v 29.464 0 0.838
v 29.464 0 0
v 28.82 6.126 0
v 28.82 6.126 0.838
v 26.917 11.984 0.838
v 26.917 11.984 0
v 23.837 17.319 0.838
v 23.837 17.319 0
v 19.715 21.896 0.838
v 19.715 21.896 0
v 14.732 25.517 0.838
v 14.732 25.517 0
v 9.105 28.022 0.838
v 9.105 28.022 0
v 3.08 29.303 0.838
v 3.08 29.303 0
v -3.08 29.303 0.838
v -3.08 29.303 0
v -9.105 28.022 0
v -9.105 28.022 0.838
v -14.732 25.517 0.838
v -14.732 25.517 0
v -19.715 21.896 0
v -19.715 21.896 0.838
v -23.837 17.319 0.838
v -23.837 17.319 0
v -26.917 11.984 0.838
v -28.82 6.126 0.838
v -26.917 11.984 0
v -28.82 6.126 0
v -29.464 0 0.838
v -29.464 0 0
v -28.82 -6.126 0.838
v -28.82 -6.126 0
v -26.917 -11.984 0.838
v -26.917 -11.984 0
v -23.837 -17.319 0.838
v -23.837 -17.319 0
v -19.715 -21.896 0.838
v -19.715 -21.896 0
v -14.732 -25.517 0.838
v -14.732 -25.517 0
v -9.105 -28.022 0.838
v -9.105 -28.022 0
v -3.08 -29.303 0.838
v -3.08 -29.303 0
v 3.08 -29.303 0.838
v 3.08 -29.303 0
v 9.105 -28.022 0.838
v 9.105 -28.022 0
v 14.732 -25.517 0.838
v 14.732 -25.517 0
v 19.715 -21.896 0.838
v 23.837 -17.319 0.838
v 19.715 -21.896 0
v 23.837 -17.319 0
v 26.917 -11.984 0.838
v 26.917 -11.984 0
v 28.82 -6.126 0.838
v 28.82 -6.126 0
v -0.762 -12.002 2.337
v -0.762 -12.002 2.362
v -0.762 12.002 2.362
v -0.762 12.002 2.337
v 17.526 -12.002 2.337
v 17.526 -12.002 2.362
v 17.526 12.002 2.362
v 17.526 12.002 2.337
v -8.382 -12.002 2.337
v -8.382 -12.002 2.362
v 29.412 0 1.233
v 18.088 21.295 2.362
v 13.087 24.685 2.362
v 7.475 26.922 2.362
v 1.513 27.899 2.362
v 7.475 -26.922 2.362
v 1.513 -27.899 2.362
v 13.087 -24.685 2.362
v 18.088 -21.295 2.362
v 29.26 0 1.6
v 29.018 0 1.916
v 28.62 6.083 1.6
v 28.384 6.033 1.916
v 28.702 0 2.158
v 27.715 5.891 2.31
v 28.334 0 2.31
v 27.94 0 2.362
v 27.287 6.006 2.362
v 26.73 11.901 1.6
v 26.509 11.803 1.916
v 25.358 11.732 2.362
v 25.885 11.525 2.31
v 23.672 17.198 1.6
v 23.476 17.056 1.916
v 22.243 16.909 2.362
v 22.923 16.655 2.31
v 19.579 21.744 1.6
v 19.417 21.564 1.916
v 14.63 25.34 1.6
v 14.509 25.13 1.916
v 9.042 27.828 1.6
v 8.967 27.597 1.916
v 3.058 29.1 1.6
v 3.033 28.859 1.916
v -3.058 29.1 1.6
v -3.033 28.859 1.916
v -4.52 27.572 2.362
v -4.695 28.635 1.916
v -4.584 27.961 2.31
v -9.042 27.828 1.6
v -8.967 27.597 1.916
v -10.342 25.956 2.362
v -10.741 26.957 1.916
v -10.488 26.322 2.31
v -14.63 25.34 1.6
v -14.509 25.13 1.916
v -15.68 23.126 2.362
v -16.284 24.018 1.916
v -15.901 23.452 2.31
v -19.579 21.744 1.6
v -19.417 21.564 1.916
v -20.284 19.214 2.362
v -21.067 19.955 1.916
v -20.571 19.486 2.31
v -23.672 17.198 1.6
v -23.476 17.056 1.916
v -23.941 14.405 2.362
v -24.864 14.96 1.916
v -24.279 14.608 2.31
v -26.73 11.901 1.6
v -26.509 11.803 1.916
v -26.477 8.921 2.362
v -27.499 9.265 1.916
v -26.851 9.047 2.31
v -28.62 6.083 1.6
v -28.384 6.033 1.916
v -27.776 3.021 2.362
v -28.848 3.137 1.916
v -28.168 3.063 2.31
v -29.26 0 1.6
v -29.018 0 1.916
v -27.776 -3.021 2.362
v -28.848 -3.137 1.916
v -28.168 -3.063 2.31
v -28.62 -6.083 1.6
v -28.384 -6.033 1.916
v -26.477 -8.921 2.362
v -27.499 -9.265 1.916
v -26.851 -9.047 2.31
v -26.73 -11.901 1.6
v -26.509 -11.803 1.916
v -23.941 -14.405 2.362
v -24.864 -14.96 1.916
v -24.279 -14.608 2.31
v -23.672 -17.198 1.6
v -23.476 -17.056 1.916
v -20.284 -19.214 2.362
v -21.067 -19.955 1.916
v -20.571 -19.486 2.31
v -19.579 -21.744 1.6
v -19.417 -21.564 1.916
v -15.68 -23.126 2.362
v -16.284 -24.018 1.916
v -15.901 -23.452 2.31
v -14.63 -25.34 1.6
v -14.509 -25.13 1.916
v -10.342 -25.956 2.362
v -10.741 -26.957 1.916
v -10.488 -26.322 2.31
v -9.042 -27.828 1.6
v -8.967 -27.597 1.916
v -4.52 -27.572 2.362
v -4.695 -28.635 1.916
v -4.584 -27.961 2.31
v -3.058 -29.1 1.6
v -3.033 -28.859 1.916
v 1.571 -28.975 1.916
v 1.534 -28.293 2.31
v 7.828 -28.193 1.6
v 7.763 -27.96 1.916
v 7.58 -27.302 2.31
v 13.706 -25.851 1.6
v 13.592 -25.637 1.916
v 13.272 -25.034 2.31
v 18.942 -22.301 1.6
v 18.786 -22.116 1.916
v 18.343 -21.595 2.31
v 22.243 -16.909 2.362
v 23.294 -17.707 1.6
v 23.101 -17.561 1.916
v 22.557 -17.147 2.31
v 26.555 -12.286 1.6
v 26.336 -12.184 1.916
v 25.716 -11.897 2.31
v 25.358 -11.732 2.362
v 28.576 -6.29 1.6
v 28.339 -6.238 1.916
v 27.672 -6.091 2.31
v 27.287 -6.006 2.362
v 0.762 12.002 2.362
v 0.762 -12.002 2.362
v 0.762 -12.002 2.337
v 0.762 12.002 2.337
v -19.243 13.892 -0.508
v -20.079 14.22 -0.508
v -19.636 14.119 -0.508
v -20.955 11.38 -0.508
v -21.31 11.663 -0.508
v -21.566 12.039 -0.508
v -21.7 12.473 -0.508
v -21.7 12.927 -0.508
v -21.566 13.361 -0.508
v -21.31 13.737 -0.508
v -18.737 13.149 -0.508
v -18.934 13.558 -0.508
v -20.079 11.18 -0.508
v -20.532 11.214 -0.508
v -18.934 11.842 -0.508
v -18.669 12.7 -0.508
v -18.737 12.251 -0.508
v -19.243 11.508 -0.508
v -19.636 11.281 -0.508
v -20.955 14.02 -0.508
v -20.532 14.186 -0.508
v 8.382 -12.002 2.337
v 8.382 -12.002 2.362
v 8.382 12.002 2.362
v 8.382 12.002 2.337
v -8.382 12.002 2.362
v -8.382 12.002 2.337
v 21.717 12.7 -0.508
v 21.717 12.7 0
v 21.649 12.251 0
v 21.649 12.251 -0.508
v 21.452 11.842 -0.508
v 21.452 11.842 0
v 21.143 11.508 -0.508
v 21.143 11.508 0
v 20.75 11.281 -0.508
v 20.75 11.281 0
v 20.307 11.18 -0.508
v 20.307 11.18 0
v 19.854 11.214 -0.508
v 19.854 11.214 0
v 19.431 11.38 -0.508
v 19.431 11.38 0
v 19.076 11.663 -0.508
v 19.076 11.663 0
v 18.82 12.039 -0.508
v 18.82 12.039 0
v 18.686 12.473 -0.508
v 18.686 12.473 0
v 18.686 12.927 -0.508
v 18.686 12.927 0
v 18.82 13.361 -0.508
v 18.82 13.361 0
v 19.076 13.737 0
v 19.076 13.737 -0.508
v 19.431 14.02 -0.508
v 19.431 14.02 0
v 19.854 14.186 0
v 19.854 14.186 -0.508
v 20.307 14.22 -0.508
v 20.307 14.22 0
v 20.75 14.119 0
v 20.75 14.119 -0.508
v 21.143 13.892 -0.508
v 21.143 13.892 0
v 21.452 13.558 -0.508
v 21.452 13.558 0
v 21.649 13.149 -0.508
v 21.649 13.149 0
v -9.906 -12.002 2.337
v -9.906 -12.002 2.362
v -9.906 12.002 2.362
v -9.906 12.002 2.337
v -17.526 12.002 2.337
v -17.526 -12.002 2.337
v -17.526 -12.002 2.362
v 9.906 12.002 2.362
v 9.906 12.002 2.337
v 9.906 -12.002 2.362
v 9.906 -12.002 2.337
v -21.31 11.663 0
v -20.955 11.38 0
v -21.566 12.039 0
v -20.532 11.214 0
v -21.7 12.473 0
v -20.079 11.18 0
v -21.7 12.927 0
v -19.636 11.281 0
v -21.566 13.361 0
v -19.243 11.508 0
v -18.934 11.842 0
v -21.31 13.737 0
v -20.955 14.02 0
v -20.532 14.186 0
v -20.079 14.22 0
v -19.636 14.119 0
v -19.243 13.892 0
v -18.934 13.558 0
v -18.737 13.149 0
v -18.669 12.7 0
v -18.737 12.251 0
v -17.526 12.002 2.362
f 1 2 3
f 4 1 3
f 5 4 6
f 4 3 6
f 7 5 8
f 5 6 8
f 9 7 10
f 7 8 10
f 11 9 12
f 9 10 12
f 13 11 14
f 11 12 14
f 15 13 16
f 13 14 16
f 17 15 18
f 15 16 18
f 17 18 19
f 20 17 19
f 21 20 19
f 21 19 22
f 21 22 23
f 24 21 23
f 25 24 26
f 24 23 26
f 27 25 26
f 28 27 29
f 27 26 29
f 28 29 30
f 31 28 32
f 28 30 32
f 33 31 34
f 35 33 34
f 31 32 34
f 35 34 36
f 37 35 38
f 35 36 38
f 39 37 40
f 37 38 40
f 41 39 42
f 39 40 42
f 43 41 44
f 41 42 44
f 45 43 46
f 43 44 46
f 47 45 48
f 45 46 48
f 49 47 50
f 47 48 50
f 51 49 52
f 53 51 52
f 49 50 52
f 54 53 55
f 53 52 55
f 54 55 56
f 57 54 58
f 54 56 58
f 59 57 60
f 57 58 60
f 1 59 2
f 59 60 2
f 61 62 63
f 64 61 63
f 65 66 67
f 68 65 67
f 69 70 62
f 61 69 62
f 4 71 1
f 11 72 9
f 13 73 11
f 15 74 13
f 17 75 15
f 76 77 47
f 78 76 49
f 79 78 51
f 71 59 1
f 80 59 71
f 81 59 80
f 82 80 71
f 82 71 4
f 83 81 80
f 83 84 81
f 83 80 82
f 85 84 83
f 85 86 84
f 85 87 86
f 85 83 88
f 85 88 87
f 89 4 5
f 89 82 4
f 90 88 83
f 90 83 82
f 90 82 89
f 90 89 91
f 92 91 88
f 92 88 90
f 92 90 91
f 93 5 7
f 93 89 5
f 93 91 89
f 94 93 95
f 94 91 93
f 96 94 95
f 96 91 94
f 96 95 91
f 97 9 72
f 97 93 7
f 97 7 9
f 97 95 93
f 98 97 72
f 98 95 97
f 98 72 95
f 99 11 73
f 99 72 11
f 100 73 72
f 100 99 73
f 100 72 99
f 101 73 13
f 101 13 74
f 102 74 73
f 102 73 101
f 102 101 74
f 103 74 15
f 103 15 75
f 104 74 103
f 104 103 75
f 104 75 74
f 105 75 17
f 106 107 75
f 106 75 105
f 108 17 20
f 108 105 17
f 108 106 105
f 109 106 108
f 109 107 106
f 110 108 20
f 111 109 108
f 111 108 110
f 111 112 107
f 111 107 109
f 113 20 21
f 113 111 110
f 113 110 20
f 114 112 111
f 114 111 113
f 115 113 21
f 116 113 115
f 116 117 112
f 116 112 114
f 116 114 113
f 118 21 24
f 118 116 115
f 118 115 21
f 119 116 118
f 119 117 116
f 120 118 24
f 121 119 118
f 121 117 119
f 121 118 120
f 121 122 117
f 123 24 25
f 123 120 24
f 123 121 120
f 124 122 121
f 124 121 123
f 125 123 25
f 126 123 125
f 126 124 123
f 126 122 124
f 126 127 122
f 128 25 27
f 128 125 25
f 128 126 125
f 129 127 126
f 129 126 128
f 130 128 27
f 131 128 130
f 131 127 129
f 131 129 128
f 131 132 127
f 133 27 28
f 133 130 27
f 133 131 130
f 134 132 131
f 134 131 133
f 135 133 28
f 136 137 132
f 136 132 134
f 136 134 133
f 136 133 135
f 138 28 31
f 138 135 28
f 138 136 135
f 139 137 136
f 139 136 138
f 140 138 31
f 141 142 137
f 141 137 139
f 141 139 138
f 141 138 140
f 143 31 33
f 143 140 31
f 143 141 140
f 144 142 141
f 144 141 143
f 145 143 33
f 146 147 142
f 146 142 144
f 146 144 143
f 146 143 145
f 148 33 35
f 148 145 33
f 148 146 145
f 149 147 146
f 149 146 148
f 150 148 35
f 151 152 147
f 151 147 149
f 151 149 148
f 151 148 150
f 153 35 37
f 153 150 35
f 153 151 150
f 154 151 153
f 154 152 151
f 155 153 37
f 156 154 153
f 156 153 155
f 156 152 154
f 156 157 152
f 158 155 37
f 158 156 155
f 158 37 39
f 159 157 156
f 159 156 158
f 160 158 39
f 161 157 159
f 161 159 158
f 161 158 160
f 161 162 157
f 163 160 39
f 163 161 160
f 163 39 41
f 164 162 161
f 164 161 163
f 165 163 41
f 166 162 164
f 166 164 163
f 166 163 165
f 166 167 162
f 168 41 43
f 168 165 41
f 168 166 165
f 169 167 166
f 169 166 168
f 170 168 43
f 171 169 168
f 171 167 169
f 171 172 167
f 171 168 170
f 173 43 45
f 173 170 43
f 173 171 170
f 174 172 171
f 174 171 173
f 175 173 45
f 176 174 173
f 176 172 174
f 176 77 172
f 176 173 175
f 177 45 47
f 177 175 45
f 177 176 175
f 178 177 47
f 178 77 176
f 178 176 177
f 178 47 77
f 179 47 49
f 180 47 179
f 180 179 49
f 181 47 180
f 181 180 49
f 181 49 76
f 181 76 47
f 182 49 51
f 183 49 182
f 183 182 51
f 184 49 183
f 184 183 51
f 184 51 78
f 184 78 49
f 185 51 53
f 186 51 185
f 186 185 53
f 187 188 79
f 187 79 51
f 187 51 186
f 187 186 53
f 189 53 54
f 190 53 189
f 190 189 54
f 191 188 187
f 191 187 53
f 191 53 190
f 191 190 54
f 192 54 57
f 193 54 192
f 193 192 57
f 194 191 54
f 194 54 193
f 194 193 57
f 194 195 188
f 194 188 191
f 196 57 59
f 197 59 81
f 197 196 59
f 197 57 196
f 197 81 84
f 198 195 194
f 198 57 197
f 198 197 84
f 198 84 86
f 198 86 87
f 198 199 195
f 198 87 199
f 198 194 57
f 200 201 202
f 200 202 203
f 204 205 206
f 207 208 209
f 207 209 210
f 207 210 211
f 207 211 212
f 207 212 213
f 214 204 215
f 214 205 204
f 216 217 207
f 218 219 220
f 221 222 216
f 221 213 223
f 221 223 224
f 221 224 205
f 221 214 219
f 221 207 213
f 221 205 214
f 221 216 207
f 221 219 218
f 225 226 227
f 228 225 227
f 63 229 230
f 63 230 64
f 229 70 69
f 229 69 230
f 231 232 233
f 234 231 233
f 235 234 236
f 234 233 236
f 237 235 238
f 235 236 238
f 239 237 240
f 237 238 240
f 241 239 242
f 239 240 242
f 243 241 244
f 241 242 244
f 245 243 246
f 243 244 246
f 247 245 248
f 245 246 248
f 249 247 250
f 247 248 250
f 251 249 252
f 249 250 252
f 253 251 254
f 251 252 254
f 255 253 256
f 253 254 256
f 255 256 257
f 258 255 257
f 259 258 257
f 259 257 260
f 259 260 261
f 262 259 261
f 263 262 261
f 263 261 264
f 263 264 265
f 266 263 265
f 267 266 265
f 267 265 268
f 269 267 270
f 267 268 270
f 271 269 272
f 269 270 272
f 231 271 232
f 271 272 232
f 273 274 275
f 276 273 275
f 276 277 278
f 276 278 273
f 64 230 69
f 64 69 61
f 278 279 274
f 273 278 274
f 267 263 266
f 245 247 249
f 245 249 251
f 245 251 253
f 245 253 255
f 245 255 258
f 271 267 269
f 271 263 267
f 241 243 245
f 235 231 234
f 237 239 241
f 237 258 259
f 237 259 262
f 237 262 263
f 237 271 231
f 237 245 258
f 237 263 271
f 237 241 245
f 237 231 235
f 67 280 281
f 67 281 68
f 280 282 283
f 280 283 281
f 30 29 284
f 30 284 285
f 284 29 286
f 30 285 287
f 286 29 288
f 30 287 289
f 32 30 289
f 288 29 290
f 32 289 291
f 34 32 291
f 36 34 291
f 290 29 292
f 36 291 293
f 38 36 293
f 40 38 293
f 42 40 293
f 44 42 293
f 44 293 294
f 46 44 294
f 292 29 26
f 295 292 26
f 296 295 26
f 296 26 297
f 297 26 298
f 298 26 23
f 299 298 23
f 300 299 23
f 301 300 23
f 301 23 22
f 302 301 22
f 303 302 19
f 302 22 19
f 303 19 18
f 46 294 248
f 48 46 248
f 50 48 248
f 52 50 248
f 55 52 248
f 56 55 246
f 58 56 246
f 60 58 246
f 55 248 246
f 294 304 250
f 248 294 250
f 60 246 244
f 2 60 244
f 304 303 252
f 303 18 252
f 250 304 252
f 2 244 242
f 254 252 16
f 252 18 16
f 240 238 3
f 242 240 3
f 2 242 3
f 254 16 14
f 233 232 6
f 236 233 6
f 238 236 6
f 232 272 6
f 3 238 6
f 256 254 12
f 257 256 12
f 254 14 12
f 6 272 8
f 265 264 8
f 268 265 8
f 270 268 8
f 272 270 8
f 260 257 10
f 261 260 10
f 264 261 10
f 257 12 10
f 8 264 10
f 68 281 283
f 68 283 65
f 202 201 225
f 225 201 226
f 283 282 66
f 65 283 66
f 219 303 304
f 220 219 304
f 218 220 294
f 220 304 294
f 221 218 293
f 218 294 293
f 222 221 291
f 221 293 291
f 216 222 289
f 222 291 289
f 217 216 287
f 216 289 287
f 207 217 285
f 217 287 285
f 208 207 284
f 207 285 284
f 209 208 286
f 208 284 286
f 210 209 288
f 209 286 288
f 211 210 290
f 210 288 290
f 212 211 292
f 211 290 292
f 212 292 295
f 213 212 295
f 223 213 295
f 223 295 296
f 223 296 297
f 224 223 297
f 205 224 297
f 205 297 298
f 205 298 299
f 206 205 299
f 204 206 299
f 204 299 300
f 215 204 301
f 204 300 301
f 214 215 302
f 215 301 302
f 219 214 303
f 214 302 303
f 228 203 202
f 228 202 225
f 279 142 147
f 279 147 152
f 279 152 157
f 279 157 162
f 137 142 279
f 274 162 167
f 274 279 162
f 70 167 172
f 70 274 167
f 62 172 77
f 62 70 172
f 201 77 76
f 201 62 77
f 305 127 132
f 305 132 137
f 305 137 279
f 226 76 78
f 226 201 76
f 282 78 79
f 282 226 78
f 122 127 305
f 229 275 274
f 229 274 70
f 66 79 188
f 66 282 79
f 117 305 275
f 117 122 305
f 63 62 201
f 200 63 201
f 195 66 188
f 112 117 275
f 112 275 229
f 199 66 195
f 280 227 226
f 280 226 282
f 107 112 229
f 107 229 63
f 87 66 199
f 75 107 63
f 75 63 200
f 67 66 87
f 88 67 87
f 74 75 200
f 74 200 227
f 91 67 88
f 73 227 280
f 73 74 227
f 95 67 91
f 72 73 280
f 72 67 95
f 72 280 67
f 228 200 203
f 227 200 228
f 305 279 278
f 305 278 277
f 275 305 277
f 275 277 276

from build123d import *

# Parameters (mm, degrees)
F0_R     = 29.464
F1_DEPTH = 2.3622
F2_R     = 1.524
F3_W     = 7.62
F3_H     = 24.003
F4_DEPTH = 0.0254
F5_R     = 1.524
F6_DEPTH = 0.508


with BuildPart() as f1:
    # F0 (on Top) → F1 (new body)
    with BuildSketch(Plane.XY):
        Circle(F0_R)
    extrude(amount=F1_DEPTH)

    # F2
    f2_edges = [f1.edges().sort_by_distance(p)[0] for p in [
        (-29.464, 0, 2.3622),
    ]]
    fillet(f2_edges, radius=F2_R)

    # F3 (on face) → F4 (cut)
    with BuildSketch(Plane.XY.offset(2.3622)):
        with Locations((-13.716, 0)):
            Rectangle(F3_W, F3_H)
        with Locations((-4.572, 0)):
            Rectangle(F3_W, F3_H)
        with Locations((4.572, 0)):
            Rectangle(F3_W, F3_H)
        with Locations((13.716, 0)):
            Rectangle(F3_W, F3_H)
    extrude(amount=-F4_DEPTH, mode=Mode.SUBTRACT)

    # F5 (on face) → F6 (join)
    with BuildSketch(Plane(origin=(0, 0, 0), x_dir=(1, 0, 0), z_dir=(0, 0, -1))):
        with Locations((-20.193, -12.7)):
            Circle(F5_R)
        with Locations((20.193, -12.7)):
            Circle(F5_R)
    extrude(amount=F6_DEPTH)


solid = f1.part
